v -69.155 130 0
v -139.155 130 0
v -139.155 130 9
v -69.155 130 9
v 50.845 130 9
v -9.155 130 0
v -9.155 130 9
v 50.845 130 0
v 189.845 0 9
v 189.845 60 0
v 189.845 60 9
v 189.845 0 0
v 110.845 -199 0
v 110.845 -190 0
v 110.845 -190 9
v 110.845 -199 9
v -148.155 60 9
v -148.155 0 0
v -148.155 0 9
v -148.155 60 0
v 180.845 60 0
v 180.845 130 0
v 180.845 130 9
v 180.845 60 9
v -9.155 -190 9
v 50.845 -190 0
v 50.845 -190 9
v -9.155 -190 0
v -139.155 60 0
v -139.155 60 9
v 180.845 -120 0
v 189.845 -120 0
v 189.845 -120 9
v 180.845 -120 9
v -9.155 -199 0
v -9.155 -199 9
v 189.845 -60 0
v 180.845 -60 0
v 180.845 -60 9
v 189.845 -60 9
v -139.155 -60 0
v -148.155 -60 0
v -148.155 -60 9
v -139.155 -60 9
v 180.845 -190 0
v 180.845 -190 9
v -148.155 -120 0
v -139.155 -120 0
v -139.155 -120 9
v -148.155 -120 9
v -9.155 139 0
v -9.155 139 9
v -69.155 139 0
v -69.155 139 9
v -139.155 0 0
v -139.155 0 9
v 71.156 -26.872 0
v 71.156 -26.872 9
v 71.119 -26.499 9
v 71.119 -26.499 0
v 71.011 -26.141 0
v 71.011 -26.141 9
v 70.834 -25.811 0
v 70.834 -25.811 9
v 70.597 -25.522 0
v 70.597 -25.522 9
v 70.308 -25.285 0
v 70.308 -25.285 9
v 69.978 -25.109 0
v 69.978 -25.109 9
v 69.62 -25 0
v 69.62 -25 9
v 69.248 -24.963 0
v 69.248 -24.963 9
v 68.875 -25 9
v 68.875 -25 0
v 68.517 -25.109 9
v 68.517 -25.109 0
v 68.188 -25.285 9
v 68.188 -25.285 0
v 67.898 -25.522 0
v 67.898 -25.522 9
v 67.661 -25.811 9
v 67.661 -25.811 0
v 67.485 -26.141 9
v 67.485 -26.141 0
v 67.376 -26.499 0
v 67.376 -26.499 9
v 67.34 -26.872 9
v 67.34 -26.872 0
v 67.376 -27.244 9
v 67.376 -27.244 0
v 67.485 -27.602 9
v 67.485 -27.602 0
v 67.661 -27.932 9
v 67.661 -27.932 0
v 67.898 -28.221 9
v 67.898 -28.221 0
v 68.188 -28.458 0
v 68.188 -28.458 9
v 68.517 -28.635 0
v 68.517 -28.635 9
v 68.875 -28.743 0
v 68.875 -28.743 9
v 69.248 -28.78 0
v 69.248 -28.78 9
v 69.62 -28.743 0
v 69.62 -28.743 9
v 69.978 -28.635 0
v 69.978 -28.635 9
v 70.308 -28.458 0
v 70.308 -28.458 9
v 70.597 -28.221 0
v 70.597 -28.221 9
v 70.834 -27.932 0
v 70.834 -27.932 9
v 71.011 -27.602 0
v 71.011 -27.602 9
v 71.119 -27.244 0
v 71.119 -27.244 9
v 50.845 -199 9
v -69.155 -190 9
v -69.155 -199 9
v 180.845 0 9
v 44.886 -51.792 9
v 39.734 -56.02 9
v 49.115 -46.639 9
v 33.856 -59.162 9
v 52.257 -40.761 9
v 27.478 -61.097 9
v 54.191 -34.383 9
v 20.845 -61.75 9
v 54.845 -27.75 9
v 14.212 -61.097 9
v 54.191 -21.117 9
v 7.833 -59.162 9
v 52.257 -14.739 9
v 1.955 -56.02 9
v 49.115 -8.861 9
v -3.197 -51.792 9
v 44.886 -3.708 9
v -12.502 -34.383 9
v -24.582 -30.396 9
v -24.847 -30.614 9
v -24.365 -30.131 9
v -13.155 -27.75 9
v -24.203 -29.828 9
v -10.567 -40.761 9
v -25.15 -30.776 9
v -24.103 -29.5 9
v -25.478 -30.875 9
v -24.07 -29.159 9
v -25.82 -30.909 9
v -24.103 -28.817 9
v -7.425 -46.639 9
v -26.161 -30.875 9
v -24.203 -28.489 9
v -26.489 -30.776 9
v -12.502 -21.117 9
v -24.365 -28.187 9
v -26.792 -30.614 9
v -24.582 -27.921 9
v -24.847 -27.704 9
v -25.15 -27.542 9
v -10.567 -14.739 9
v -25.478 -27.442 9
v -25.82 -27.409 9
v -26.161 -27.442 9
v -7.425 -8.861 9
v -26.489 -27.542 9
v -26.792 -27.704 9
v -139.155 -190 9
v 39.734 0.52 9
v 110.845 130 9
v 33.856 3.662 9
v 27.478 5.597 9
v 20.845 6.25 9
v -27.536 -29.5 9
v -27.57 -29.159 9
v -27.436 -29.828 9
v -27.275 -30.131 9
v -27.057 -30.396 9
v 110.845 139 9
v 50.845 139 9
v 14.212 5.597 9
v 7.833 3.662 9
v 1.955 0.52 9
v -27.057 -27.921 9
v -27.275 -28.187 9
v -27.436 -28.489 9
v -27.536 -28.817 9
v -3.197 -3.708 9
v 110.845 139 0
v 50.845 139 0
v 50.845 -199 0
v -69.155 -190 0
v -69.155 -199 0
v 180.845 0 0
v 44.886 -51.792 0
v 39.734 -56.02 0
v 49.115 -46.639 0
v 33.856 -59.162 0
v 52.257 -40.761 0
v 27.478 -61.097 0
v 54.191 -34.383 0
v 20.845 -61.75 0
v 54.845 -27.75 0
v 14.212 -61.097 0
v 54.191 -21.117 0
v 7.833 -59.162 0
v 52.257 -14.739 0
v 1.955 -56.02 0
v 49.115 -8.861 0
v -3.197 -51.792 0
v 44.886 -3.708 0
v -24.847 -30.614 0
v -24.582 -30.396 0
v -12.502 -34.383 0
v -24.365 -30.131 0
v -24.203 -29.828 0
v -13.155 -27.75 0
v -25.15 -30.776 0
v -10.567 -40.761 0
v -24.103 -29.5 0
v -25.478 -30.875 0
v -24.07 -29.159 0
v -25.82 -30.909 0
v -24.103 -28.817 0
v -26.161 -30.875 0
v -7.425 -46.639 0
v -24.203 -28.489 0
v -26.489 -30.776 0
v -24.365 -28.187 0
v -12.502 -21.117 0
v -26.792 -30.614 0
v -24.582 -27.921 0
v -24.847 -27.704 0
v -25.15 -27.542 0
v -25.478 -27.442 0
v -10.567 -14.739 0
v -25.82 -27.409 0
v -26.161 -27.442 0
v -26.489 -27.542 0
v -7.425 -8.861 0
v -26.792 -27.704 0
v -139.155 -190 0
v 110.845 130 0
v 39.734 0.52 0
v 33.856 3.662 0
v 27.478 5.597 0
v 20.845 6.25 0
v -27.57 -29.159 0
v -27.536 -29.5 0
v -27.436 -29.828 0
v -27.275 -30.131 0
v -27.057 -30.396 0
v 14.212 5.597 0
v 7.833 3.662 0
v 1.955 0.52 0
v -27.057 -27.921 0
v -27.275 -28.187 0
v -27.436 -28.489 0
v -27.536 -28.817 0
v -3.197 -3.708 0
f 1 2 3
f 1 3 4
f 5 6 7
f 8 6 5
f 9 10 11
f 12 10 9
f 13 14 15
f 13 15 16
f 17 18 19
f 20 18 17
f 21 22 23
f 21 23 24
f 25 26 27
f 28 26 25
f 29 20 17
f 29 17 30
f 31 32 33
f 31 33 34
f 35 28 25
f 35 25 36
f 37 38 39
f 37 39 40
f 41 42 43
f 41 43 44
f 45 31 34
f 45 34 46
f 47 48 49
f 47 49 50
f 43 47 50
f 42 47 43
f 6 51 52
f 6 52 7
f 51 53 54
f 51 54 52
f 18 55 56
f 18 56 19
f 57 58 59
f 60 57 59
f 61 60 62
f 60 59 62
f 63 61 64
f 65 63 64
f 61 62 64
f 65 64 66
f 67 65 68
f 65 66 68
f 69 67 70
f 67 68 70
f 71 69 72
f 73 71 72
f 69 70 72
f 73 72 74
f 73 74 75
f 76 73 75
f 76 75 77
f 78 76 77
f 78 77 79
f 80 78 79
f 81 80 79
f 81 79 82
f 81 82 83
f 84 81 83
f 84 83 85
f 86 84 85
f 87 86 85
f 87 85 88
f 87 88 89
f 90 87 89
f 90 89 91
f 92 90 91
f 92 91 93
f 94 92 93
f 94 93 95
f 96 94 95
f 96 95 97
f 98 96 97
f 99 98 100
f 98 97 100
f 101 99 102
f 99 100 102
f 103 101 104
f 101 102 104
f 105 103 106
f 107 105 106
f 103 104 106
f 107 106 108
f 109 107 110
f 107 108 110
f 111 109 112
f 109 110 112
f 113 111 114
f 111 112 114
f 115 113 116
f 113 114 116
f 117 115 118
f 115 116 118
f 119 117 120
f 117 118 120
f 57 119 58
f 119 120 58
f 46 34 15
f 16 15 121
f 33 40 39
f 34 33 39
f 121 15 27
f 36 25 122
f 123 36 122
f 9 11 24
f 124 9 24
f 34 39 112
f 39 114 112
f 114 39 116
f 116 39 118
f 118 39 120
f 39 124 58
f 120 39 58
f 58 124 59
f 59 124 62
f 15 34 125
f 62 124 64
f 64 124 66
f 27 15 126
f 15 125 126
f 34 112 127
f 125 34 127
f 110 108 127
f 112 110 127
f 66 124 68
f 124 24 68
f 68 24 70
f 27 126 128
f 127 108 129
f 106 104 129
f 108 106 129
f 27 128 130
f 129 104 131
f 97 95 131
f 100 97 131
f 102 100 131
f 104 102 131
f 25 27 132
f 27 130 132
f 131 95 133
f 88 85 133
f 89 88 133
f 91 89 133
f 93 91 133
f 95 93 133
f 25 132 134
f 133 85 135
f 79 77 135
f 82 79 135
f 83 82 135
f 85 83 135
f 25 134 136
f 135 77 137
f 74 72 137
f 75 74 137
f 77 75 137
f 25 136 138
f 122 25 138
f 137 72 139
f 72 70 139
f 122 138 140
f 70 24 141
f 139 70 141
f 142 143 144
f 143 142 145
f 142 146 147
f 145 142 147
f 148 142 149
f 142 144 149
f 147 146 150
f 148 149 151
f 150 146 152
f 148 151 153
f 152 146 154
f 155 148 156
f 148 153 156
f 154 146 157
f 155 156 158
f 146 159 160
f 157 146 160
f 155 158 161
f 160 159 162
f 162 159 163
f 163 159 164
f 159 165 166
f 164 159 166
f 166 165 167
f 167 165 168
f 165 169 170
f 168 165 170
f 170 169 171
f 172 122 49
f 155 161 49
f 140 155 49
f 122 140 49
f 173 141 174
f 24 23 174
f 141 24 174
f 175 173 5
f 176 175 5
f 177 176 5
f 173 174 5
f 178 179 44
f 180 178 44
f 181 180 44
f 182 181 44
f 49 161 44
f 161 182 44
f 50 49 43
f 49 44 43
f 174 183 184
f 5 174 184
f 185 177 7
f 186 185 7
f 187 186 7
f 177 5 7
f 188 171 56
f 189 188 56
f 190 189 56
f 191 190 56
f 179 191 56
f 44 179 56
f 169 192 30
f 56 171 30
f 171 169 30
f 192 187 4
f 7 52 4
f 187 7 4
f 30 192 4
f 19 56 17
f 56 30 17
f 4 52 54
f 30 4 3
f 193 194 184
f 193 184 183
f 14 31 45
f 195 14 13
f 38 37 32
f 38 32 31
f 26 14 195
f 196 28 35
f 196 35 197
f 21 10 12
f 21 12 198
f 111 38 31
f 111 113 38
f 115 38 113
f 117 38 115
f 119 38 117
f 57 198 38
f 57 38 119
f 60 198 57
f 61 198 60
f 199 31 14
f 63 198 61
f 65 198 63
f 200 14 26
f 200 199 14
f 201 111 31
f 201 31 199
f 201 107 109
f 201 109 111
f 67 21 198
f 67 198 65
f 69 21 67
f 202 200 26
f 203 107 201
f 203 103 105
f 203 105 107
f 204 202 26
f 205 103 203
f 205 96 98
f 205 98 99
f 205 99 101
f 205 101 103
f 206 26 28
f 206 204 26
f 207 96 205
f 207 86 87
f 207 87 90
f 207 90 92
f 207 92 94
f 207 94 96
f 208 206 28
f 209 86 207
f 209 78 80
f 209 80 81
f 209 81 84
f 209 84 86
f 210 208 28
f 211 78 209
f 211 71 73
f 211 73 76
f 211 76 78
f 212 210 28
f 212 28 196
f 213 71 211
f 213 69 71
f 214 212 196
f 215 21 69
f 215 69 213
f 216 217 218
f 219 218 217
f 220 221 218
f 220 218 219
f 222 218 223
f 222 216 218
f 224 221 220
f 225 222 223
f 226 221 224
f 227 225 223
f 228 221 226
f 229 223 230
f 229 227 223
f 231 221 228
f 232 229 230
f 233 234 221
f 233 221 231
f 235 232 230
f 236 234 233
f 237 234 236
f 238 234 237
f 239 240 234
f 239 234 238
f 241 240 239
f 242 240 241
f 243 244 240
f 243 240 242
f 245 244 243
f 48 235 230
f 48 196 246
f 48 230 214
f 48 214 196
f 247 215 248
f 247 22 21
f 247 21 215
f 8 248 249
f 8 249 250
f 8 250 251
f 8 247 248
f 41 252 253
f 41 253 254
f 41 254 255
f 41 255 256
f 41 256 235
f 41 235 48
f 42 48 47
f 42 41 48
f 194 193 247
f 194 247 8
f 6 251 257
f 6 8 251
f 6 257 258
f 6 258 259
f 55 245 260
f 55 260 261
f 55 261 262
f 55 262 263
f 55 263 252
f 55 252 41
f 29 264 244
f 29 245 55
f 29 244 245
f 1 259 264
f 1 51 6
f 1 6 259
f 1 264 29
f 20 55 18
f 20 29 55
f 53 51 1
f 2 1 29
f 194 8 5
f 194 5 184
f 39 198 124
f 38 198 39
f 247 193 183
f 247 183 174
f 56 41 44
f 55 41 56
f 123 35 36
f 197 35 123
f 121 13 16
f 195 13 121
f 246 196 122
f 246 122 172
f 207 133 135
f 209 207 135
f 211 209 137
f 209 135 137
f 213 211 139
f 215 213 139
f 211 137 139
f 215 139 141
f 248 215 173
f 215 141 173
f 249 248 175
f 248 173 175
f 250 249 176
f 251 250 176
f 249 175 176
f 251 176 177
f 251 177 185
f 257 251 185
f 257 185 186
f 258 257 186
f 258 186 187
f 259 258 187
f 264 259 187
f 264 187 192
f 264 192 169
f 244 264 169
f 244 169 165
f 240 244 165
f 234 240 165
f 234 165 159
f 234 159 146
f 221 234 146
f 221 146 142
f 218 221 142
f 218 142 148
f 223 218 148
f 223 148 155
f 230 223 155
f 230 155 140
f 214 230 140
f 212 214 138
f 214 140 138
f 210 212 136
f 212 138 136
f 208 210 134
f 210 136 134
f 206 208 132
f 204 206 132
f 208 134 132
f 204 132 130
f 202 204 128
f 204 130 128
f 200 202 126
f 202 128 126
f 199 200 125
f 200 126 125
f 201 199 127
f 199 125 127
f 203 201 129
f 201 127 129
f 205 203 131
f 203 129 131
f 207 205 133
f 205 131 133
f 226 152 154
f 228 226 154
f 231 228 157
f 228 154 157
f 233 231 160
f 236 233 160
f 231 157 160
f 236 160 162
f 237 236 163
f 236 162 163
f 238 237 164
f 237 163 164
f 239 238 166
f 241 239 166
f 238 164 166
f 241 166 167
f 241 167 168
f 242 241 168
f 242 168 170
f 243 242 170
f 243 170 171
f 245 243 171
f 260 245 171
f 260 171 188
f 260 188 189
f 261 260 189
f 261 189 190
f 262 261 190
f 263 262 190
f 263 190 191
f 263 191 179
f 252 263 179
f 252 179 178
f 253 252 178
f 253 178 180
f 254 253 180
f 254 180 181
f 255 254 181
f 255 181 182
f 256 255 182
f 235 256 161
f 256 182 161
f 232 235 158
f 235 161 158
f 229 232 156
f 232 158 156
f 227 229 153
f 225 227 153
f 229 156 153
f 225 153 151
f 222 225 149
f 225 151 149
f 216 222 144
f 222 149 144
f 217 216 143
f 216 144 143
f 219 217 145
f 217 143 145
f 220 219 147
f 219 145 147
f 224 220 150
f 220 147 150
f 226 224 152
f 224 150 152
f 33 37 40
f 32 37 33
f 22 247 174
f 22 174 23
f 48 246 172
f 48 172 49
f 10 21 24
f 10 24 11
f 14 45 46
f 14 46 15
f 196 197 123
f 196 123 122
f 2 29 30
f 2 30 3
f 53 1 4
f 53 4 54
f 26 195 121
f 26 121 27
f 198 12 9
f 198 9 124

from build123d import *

# Parameters (mm, degrees)
BOSS_EXTRUDE1_DEPTH = 9
SKETCH3_R           = 34
CUT_EXTRUDE1_DEPTH  = 10
SKETCH4_R           = 1.908180832
SKETCH4_R_2         = 1.75
CUT_EXTRUDE2_DEPTH  = 276.178116638


with BuildPart() as part:
    # Sketch2 → Boss-Extrude1 (new body)
    with BuildSketch(Plane.XY):
        Polygon((110.844662491, -190), (110.844662491, -199), (50.844662491, -199), (50.844662491, -190), (-9.155337509, -190), (-9.155337509, -199), (-69.155337509, -199), (-69.155337509, -190), (-139.155337509, -190), (-139.155337509, -120), (-148.155337509, -120), (-148.155337509, -60), (-139.155337509, -60), (-139.155337509, 0), (-148.155337509, 0), (-148.155337509, 60), (-139.155337509, 60), (-139.155337509, 130), (-69.155337509, 130), (-69.155337509, 139), (-9.155337509, 139), (-9.155337509, 130), (50.844662491, 130), (50.844662491, 139), (110.844662491, 139), (110.844662491, 130), (180.844662491, 130), (180.844662491, 60), (189.844662491, 60), (189.844662491, 0), (180.844662491, 0), (180.844662491, -60), (189.844662491, -60), (189.844662491, -120), (180.844662491, -120), (180.844662491, -190), align=None)
    extrude(amount=BOSS_EXTRUDE1_DEPTH)

    # Sketch3 → Cut-Extrude1 (cut)
    with BuildSketch(Plane.XY.offset(9)):
        with Locations((20.844662491, -27.75)):
            Circle(SKETCH3_R)
    extrude(amount=-CUT_EXTRUDE1_DEPTH, mode=Mode.SUBTRACT)

    # Sketch4 → Cut-Extrude2 (cut, through all)
    with BuildSketch(Plane.XY.offset(9)):
        with Locations((69.247698425, -26.871593426)):
            Circle(SKETCH4_R)
        with Locations((-25.819672208, -29.158773424)):
            Circle(SKETCH4_R_2)
    extrude(amount=-CUT_EXTRUDE2_DEPTH, mode=Mode.SUBTRACT)


solid = part.part
